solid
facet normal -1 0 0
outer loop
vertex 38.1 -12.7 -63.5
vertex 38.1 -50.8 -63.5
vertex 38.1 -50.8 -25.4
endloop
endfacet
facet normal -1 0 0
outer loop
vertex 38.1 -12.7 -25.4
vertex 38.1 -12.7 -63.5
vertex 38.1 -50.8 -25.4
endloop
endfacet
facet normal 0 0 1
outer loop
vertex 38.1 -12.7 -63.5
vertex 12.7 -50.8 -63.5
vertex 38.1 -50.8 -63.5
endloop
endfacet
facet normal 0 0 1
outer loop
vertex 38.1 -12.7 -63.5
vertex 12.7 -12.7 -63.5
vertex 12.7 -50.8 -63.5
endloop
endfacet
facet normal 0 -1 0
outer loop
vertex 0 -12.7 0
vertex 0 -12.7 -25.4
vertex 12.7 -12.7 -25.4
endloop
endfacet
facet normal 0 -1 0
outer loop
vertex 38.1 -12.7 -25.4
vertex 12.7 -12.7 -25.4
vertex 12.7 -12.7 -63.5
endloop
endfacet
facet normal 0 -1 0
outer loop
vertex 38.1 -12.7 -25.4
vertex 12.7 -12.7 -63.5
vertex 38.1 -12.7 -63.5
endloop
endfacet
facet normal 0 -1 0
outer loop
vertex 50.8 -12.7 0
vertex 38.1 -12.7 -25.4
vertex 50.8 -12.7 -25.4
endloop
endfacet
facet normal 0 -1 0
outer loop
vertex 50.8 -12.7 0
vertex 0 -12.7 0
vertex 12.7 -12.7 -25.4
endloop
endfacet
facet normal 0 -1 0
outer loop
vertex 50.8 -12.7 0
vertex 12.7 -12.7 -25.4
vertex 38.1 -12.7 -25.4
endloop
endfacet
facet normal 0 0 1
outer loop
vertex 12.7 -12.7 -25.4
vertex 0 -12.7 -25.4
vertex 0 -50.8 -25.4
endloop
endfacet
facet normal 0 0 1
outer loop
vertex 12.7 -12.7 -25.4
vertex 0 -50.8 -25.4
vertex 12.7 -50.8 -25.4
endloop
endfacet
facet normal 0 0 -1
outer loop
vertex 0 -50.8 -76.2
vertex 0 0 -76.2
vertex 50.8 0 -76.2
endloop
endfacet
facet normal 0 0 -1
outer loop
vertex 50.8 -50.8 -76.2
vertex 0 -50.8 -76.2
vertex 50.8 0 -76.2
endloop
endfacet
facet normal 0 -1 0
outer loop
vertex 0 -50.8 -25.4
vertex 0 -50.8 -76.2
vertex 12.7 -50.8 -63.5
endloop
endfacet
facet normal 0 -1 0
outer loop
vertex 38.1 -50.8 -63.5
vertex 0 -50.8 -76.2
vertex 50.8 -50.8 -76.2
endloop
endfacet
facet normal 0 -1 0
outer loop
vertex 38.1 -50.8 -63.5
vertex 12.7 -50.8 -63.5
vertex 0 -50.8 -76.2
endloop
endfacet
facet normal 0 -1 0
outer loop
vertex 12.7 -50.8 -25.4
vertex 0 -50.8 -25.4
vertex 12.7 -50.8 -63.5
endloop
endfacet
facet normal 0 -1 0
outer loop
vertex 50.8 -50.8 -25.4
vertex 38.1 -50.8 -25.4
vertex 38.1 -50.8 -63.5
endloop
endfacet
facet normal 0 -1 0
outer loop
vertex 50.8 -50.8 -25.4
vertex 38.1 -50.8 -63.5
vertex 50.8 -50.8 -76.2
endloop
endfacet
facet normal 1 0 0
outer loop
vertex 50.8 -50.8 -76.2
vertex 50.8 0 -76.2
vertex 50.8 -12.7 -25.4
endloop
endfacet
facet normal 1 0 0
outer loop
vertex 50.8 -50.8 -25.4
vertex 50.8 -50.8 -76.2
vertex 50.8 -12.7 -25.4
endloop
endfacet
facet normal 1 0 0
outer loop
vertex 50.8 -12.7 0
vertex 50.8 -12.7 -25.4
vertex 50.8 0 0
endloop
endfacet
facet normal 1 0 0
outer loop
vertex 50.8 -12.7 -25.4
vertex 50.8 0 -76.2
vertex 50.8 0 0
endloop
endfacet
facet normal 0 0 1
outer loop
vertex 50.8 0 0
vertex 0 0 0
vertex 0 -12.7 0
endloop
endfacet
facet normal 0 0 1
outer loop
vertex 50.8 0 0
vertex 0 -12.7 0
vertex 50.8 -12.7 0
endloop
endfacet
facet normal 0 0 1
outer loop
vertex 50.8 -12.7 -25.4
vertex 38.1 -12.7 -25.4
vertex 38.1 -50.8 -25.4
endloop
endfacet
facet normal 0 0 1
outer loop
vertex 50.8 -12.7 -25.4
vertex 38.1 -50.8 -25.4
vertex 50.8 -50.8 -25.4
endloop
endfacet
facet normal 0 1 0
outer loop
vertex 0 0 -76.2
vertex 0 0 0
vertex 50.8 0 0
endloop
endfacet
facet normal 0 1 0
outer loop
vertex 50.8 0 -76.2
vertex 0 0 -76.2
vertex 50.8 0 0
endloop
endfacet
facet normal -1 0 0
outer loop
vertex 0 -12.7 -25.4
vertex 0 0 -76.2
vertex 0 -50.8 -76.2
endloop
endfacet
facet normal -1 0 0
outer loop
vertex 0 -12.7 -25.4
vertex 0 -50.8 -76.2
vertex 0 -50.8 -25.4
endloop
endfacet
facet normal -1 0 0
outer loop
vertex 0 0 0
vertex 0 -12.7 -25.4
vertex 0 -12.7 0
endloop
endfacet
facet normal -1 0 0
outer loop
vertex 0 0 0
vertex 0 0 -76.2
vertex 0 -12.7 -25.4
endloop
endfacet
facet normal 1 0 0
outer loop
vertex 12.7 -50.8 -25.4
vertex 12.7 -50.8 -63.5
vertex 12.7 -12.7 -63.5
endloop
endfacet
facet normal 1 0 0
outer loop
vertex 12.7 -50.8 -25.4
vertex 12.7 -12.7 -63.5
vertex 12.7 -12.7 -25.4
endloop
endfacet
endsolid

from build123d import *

# Parameters (mm, degrees)
F0_W     = 50.8
F0_H     = 76.2
F1_DEPTH = 50.8
F2_T     = -12.7
F3_W     = 12.7
F3_H     = 25.4
F4_DEPTH = 38.1


with BuildPart() as f1:
    # F0 (on Front) → F1 (new body)
    with BuildSketch(Plane.XZ):
        with Locations((25.4, -38.1)):
            Rectangle(F0_W, F0_H)
    extrude(amount=F1_DEPTH)

    # F2
    f2_openings = [f1.faces().sort_by_distance(p)[0] for p in [
        (25.4, -50.8, -38.1),
        (25.4, -25.4, 0),
    ]]
    offset(amount=F2_T, openings=f2_openings)

    # F3 (on face) → F4 (cut)
    with BuildSketch(Plane.XZ.offset(12.7)):
        with Locations((6.35, -12.7)):
            Rectangle(F3_W, F3_H)
        with Locations((44.45, -12.7)):
            Rectangle(F3_W, F3_H)
    extrude(amount=F4_DEPTH, mode=Mode.SUBTRACT)


solid = f1.part
